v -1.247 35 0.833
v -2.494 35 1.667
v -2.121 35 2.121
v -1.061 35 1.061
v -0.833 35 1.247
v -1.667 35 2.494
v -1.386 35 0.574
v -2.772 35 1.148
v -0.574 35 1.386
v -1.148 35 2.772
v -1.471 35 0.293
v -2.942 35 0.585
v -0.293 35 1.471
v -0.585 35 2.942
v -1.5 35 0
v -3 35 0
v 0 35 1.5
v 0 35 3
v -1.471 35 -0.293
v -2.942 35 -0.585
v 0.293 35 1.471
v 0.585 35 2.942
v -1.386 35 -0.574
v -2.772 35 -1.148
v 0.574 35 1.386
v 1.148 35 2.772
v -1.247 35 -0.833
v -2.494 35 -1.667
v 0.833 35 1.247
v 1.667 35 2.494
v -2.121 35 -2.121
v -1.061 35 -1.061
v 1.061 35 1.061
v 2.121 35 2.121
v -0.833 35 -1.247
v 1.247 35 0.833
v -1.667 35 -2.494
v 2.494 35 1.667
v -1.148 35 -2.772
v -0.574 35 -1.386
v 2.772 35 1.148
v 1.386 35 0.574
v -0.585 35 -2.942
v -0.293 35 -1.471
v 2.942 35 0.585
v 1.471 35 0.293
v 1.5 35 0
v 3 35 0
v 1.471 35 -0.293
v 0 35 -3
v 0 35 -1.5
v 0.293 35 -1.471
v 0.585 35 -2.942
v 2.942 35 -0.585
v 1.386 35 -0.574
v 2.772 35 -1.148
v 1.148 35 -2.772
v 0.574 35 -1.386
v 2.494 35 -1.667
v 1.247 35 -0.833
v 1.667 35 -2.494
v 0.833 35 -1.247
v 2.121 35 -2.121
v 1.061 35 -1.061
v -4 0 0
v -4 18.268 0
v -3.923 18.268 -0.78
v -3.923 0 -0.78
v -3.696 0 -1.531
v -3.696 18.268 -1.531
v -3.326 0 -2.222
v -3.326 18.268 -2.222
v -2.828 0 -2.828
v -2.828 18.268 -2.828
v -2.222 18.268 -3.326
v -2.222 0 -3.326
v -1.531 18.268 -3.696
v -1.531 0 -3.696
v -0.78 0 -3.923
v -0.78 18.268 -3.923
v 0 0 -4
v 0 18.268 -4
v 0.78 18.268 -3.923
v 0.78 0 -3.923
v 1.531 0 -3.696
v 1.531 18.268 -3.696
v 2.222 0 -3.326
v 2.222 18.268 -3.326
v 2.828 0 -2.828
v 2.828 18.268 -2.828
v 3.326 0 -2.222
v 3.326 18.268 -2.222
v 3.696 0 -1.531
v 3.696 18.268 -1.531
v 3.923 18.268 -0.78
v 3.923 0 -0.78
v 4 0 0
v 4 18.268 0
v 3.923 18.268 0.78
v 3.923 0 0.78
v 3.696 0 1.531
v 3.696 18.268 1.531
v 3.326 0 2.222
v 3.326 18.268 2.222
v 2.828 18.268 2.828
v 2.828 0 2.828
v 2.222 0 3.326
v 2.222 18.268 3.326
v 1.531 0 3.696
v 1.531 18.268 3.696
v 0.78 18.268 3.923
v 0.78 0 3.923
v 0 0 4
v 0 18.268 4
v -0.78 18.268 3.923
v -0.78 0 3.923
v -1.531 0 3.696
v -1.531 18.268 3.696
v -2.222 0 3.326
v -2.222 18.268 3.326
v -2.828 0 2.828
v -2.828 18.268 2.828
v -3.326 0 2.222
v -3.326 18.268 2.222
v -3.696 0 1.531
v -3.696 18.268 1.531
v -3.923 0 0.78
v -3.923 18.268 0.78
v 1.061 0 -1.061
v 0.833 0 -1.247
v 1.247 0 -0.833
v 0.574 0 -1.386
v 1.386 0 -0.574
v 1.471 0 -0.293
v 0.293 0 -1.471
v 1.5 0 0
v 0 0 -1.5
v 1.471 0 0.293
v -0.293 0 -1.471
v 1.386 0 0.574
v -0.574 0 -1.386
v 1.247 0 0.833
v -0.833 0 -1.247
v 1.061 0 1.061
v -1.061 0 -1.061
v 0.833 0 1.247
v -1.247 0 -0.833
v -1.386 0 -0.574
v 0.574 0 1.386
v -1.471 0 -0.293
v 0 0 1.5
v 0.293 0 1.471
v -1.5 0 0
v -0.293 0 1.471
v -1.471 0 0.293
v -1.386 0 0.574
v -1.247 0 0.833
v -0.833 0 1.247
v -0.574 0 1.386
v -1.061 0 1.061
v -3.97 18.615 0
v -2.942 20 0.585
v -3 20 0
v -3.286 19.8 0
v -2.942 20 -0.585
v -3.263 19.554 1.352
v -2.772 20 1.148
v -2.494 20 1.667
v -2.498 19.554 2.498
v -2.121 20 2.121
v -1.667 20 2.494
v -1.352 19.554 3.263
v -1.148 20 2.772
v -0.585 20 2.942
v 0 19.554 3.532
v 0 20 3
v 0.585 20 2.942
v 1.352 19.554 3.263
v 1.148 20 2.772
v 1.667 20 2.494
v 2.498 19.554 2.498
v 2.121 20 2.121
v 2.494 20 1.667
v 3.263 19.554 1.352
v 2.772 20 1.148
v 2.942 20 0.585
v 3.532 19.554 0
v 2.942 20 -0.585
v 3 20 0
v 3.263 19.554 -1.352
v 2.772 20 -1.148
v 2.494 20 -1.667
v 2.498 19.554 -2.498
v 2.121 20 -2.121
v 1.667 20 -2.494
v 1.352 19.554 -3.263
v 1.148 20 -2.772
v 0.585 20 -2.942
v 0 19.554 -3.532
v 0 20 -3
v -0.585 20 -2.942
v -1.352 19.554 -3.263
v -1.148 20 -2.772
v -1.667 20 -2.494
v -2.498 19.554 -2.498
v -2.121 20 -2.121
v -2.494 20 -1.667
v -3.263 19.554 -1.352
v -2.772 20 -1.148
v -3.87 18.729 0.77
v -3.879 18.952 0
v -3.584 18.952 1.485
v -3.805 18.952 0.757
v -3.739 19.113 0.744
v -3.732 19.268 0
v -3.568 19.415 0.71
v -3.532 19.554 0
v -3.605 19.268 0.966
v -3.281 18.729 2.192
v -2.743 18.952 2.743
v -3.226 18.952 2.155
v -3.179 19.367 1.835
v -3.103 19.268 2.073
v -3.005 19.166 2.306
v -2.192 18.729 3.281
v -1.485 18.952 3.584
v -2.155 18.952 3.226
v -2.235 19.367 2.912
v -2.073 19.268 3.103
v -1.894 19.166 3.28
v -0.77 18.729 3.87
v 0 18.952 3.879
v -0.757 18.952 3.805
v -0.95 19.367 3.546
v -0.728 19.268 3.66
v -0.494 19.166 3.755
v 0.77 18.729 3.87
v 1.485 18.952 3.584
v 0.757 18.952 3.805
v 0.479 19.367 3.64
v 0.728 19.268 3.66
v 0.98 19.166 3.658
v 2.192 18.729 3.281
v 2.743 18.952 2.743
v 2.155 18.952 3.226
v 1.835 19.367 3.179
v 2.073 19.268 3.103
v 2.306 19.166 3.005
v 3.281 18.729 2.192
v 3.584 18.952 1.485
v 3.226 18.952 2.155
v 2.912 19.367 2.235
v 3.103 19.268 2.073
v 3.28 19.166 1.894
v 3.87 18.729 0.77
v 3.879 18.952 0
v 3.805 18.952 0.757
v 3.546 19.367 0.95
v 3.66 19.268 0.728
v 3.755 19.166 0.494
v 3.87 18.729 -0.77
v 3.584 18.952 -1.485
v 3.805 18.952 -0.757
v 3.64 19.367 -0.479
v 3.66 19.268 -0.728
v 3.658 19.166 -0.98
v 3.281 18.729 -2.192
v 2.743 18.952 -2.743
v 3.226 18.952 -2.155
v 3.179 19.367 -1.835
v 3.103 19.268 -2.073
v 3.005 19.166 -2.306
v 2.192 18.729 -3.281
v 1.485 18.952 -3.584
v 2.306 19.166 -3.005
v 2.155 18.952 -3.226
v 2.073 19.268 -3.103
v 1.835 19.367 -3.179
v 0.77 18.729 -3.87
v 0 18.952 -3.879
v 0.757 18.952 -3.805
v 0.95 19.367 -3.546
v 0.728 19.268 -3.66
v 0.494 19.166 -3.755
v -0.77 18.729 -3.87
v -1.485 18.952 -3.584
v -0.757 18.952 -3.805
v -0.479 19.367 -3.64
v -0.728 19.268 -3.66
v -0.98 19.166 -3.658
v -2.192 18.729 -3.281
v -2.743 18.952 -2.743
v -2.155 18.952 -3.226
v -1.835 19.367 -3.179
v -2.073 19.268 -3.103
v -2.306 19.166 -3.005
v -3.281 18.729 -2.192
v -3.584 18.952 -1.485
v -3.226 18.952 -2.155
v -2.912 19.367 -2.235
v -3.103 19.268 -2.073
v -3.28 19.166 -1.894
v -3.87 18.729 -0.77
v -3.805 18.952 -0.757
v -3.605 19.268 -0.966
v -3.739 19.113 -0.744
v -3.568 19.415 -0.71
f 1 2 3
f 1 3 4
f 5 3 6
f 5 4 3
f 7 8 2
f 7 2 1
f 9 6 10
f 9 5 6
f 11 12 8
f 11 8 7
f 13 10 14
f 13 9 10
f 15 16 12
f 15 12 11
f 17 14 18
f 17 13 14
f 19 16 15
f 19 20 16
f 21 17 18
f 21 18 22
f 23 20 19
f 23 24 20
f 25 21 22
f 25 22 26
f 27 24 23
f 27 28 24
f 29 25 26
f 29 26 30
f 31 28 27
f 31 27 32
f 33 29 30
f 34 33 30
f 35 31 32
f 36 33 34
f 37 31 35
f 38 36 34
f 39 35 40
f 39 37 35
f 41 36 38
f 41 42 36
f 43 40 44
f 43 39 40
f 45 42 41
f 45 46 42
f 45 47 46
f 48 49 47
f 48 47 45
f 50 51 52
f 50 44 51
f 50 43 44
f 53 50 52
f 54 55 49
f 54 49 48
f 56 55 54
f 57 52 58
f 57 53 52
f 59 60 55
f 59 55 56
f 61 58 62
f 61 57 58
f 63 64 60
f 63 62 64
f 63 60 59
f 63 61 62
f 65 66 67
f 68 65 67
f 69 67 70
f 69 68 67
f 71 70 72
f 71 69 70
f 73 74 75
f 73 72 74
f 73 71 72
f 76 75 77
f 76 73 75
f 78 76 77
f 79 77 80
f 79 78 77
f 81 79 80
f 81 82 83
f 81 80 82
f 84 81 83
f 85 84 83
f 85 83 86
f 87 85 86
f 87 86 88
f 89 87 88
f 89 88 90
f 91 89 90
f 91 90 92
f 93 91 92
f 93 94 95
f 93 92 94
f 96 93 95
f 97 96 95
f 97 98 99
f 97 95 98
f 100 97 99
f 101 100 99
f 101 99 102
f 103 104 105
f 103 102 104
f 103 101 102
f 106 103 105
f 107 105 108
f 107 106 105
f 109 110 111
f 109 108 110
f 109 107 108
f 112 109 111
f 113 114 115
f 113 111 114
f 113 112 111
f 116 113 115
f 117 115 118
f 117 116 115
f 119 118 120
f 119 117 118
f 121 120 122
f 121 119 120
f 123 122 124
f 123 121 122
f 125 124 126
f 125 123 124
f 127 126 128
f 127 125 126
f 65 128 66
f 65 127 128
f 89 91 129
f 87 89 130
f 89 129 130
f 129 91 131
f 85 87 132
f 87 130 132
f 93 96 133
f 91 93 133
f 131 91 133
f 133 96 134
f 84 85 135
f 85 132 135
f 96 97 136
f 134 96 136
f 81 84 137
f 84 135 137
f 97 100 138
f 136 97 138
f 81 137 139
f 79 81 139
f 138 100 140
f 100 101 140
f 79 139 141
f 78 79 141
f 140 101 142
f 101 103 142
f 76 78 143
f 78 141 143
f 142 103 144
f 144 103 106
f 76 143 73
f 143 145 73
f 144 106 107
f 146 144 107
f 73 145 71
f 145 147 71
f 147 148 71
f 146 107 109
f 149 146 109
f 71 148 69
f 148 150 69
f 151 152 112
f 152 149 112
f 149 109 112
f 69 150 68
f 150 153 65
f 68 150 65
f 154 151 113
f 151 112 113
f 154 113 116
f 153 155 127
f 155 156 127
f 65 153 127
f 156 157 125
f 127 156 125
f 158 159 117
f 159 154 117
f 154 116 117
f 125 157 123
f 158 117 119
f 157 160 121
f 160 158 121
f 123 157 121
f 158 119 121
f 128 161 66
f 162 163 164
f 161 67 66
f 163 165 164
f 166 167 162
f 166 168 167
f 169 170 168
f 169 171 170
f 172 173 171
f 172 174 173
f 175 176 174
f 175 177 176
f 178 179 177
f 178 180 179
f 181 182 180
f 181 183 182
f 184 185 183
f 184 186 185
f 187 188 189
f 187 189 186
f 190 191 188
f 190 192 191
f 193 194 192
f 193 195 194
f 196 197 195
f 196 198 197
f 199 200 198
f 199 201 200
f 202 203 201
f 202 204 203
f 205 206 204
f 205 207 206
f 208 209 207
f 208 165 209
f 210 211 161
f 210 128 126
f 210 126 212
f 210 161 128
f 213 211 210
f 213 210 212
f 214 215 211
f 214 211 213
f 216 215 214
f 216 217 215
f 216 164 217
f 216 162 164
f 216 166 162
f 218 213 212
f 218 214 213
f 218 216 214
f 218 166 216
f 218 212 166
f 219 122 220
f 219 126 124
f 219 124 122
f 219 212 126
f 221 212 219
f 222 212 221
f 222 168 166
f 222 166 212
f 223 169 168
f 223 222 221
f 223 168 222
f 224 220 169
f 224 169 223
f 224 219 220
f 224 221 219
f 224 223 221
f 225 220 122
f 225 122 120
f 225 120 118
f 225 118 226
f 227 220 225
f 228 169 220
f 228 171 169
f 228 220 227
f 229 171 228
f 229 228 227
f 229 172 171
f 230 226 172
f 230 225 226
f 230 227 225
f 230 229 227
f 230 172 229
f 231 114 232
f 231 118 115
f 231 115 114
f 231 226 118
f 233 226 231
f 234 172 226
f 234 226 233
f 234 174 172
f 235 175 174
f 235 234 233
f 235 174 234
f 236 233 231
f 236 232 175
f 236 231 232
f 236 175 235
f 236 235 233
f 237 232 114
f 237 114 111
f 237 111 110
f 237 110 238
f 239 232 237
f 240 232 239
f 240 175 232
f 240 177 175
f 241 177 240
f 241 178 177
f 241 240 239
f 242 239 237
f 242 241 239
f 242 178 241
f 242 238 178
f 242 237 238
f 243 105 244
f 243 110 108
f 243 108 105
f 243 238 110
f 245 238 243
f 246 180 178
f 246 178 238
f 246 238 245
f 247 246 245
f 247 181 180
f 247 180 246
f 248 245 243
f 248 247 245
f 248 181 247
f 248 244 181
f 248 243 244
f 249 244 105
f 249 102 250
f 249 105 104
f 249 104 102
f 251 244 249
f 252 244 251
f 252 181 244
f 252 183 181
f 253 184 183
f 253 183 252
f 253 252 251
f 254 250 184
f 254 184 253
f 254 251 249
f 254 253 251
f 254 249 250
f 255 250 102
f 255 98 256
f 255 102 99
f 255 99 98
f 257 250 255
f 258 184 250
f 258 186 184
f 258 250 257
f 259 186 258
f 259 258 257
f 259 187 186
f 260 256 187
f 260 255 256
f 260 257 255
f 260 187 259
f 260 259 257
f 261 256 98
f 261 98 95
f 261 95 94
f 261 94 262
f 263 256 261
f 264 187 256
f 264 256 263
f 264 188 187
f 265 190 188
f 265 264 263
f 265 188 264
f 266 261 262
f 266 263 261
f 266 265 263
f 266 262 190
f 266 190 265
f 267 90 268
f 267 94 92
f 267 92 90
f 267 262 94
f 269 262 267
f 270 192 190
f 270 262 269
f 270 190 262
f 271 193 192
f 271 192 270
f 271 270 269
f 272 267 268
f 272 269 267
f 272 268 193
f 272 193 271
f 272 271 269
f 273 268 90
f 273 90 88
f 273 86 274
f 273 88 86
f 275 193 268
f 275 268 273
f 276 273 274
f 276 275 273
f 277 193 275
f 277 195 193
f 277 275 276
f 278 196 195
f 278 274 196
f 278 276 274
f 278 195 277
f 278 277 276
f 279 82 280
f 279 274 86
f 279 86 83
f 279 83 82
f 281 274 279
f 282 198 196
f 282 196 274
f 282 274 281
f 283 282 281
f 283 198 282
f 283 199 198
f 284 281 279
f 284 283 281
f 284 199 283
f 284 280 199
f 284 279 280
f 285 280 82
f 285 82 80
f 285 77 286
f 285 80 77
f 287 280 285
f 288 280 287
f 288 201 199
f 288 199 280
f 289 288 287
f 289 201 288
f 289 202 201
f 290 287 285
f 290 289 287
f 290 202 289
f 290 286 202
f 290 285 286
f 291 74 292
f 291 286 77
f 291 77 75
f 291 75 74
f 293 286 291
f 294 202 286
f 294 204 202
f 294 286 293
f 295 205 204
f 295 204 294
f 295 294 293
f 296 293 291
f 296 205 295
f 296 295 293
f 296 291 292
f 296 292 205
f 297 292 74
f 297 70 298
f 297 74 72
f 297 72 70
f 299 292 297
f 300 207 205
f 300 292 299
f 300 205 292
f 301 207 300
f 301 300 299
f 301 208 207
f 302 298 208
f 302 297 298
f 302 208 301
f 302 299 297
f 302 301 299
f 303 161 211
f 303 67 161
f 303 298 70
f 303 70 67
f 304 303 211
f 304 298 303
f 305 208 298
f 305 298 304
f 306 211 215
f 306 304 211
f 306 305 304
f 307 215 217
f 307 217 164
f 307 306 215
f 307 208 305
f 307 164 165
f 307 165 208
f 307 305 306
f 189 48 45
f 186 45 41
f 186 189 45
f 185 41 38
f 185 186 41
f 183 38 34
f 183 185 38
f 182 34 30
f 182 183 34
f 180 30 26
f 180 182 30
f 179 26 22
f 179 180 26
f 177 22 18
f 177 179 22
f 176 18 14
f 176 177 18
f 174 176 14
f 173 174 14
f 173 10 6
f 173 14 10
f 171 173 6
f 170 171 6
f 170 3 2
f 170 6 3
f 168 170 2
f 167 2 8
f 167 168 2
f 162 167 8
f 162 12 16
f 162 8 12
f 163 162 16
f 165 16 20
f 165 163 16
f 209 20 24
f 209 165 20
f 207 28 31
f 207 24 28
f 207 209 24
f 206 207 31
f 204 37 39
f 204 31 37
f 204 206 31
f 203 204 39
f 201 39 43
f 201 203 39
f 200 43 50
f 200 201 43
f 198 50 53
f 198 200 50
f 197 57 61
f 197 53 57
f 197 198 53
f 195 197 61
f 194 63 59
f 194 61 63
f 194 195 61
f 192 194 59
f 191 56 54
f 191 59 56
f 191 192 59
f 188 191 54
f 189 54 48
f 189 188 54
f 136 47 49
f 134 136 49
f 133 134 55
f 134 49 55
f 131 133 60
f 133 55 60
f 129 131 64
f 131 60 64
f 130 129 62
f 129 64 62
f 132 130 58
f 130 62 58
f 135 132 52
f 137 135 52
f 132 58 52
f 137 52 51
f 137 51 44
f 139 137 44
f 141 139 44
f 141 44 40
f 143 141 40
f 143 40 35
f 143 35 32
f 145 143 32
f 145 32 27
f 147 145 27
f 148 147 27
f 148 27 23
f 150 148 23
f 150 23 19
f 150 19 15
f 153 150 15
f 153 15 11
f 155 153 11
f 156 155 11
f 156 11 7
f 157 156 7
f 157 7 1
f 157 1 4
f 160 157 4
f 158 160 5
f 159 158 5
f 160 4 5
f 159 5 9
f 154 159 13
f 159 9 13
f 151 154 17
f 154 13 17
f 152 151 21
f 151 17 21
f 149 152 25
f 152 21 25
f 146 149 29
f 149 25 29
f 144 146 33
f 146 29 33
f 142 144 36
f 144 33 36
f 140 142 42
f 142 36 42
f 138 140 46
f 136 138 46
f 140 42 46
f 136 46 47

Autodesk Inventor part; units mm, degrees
ref_plane "YZ Plane" through (0, 0, 0) normal (1, 0, 0) x (0, 1, 0)
ref_plane "XZ Plane" through (0, 0, 0) normal (0, 1, 0) x (-1, 0, 0)
ref_plane "XY Plane" through (0, 0, 0) normal (0, 0, 1) x (1, 0, 0)
sketch "Sketch1" plane through (0, 0, 0) normal (0, 1, 0) x (-1, 0, 0)
  circle A0 centre (0, 0) radius 4
  dimension "d0" = 8
extrude "Extrusion1" add sketch "Sketch1" along normal blind 20
sketch "Sketch2" plane through (0, 20, 0) normal (0, 1, 0) x (1, 0, 0)
  circle A0 centre (0, 0) radius 3
  dimension "d3" = 6
extrude "Extrusion2" add sketch "Sketch2" along normal blind 15
fillet "Fillet1" radius 2 1 edges at (4, 20, 0)
sketch "Sketch3" plane through (0, 35, 0) normal (0, 1, 0) x (1, 0, 0)
  circle A0 centre (0, 0) radius 1.5
  dimension "d7" = 3
extrude "Extrusion3" cut sketch "Sketch3" against normal blind 35
